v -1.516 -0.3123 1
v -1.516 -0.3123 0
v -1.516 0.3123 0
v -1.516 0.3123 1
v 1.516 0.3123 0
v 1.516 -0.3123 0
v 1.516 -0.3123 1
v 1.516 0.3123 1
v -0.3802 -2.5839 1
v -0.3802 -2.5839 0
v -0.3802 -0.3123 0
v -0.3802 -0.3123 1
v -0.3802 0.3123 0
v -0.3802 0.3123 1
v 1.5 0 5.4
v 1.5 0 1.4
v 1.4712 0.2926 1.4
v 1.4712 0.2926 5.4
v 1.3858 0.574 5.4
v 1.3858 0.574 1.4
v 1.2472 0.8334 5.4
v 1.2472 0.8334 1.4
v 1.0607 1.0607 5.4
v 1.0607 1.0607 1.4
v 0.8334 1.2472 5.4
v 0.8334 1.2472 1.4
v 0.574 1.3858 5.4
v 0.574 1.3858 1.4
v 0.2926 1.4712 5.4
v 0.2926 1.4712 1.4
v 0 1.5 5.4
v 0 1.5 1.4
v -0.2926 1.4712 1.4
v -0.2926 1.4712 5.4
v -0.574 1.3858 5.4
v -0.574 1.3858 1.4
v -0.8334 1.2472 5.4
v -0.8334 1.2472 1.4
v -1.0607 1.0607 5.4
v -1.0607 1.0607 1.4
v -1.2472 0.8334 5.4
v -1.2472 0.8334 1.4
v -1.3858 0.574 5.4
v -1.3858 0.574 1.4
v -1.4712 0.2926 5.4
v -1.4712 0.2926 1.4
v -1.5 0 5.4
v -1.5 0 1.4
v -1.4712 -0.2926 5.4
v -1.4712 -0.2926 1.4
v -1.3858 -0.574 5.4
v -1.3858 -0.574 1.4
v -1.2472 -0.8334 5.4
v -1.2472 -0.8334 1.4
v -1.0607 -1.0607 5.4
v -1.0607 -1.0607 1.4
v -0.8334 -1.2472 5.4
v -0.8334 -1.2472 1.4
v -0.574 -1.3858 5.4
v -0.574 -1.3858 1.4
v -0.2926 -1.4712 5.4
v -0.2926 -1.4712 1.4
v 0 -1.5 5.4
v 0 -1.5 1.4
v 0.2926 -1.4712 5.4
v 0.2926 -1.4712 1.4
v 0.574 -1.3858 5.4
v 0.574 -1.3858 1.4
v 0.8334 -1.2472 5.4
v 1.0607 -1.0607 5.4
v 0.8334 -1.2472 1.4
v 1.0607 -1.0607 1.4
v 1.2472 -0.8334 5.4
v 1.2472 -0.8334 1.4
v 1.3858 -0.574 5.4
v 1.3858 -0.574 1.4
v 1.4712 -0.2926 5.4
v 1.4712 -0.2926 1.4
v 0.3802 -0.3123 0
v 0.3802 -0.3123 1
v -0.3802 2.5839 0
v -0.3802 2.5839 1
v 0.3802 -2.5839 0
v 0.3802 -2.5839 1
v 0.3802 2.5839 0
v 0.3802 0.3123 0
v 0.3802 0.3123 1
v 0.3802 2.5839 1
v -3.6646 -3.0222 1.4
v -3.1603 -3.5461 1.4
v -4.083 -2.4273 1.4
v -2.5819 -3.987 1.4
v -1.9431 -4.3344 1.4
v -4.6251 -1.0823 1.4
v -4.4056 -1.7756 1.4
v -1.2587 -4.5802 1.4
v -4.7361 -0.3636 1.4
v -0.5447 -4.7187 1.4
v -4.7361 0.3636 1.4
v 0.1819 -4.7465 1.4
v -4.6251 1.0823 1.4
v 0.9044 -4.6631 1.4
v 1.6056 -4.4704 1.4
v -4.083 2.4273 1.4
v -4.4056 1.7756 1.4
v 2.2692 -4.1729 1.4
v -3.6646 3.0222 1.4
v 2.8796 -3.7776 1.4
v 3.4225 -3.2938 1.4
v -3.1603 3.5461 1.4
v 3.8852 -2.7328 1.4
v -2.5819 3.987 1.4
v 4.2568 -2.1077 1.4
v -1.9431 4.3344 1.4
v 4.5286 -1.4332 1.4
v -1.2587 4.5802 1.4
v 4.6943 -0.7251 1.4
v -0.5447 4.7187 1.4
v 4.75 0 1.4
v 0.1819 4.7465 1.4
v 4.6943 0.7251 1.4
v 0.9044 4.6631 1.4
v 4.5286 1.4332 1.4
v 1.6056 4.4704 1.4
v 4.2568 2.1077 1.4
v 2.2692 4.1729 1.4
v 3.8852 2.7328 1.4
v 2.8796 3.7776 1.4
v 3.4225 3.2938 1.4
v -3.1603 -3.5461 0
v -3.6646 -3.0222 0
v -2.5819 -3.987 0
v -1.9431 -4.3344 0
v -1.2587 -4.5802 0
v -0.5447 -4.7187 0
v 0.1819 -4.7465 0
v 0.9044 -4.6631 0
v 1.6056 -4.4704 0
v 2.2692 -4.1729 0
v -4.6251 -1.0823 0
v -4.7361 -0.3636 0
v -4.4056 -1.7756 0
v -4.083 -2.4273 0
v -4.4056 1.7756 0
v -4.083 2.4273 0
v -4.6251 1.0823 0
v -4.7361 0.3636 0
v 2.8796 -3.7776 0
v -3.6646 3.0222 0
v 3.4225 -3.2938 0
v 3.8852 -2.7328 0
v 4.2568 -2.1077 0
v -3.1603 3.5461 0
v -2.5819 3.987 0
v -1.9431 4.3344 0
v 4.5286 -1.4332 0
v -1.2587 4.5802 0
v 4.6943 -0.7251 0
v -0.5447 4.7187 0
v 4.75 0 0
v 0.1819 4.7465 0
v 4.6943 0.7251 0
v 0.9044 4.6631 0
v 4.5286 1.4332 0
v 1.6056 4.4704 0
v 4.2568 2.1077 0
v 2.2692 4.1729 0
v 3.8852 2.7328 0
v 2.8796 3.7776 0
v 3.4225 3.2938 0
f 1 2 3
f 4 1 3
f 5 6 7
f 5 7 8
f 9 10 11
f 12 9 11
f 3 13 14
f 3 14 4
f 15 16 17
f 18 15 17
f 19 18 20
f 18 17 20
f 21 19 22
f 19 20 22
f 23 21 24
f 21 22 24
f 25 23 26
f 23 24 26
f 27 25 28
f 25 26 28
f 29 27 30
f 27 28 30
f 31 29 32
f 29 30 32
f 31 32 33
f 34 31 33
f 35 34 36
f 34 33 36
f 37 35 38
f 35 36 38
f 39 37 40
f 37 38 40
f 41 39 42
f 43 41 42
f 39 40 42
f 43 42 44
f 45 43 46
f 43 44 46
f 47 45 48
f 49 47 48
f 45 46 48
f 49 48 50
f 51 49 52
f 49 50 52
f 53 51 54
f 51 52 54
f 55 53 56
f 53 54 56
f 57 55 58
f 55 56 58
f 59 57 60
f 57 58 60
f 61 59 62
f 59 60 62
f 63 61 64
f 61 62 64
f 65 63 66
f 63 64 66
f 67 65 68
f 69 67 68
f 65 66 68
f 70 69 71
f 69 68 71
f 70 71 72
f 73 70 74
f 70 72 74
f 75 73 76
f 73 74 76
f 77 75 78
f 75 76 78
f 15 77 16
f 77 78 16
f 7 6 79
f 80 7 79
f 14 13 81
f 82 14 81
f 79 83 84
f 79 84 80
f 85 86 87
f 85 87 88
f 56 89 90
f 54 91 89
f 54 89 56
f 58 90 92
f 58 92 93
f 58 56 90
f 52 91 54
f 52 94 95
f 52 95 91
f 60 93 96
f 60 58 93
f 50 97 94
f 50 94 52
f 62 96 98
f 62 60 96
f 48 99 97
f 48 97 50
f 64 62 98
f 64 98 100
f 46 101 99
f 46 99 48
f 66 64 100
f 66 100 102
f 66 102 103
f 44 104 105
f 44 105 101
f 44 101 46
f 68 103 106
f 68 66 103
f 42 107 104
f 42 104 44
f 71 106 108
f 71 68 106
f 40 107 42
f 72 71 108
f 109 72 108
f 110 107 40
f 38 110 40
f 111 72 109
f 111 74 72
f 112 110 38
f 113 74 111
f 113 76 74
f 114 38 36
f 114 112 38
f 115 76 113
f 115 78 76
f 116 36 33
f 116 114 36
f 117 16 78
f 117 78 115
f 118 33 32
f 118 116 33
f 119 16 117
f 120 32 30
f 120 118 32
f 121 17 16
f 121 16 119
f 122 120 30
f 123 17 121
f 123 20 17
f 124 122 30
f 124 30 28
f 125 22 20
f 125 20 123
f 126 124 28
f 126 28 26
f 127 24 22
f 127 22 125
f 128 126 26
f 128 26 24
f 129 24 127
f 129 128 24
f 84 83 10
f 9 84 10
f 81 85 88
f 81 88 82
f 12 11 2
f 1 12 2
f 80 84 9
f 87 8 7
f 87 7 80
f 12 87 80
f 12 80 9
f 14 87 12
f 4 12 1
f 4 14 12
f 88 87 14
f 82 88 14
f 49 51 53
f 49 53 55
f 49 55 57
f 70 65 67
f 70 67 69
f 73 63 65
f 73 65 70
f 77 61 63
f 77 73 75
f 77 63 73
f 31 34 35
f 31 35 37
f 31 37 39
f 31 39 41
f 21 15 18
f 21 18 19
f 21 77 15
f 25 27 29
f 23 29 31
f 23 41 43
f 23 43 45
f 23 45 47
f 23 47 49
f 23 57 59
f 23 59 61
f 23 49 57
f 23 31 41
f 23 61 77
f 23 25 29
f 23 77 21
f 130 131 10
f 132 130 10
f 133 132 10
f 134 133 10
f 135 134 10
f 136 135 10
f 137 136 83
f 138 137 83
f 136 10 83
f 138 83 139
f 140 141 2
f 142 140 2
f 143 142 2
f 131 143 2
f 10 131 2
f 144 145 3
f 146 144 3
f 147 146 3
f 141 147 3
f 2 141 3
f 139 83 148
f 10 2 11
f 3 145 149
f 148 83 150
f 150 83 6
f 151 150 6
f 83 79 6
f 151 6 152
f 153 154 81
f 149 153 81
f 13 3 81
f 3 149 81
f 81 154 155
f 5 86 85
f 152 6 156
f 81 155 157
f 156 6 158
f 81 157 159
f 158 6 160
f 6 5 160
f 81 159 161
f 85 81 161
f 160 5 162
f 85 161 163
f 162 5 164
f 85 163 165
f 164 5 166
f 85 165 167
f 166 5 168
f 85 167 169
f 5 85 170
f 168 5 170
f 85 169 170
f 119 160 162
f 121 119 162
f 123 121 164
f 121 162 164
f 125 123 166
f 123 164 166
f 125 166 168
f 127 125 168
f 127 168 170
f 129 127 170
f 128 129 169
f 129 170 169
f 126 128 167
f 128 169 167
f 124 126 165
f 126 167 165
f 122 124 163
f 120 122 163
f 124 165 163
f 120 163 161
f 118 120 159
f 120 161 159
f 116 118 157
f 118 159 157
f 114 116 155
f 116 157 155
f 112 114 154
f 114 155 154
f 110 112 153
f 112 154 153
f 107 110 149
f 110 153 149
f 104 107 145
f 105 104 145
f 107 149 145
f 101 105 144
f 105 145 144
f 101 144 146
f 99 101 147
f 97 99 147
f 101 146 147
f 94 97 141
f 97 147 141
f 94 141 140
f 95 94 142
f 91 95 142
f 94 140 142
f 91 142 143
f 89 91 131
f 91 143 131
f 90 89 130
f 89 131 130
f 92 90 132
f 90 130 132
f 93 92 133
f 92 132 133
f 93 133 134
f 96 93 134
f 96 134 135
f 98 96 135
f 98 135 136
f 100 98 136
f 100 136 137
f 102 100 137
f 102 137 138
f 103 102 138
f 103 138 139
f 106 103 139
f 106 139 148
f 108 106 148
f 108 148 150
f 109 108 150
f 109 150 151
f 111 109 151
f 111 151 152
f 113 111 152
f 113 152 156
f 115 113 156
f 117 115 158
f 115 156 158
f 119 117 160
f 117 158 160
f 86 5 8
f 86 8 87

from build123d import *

# Parameters (mm, degrees)
SKETCH_1_R          = 4.75
EXTRUDE_1_DEPTH     = 1.4
SKETCH_2_R          = 1.5
EXTRUDE_2_DEPTH     = 4
SKETCH_3_W          = 0.760348124
SKETCH_3_H          = 2.271623197
SKETCH_3_W_2        = 1.135811598
SKETCH_3_H_2        = 0.62458345
CUT_EXTRUDE_1_DEPTH = 1


with BuildPart() as part:
    # 草图1 → 凸台-拉伸1 (new body)
    with BuildSketch(Plane.XY):
        Circle(SKETCH_1_R)
    extrude(amount=EXTRUDE_1_DEPTH)

    # 草图2 → 凸台-拉伸2 (add)
    with BuildSketch(Plane.XY.offset(1.4)):
        Circle(SKETCH_2_R)
    extrude(amount=EXTRUDE_2_DEPTH)

    # 草图3 → 切除-拉伸1 (cut)
    with BuildSketch(Plane(origin=(0, 0, 0), x_dir=(-1, 0, 0), z_dir=(0, 0, -1))):
        with Locations((0, 1.448103324)):
            Rectangle(SKETCH_3_W, SKETCH_3_H)
        with Locations((-0.948079861, 0)):
            Rectangle(SKETCH_3_W_2, SKETCH_3_H_2)
        with Locations((0.948079861, 0)):
            Rectangle(SKETCH_3_W_2, SKETCH_3_H_2)
        with Locations((0, -1.448103324)):
            Rectangle(SKETCH_3_W, SKETCH_3_H)
        Rectangle(SKETCH_3_W, SKETCH_3_H_2)
    extrude(amount=-CUT_EXTRUDE_1_DEPTH, mode=Mode.SUBTRACT)


solid = part.part
